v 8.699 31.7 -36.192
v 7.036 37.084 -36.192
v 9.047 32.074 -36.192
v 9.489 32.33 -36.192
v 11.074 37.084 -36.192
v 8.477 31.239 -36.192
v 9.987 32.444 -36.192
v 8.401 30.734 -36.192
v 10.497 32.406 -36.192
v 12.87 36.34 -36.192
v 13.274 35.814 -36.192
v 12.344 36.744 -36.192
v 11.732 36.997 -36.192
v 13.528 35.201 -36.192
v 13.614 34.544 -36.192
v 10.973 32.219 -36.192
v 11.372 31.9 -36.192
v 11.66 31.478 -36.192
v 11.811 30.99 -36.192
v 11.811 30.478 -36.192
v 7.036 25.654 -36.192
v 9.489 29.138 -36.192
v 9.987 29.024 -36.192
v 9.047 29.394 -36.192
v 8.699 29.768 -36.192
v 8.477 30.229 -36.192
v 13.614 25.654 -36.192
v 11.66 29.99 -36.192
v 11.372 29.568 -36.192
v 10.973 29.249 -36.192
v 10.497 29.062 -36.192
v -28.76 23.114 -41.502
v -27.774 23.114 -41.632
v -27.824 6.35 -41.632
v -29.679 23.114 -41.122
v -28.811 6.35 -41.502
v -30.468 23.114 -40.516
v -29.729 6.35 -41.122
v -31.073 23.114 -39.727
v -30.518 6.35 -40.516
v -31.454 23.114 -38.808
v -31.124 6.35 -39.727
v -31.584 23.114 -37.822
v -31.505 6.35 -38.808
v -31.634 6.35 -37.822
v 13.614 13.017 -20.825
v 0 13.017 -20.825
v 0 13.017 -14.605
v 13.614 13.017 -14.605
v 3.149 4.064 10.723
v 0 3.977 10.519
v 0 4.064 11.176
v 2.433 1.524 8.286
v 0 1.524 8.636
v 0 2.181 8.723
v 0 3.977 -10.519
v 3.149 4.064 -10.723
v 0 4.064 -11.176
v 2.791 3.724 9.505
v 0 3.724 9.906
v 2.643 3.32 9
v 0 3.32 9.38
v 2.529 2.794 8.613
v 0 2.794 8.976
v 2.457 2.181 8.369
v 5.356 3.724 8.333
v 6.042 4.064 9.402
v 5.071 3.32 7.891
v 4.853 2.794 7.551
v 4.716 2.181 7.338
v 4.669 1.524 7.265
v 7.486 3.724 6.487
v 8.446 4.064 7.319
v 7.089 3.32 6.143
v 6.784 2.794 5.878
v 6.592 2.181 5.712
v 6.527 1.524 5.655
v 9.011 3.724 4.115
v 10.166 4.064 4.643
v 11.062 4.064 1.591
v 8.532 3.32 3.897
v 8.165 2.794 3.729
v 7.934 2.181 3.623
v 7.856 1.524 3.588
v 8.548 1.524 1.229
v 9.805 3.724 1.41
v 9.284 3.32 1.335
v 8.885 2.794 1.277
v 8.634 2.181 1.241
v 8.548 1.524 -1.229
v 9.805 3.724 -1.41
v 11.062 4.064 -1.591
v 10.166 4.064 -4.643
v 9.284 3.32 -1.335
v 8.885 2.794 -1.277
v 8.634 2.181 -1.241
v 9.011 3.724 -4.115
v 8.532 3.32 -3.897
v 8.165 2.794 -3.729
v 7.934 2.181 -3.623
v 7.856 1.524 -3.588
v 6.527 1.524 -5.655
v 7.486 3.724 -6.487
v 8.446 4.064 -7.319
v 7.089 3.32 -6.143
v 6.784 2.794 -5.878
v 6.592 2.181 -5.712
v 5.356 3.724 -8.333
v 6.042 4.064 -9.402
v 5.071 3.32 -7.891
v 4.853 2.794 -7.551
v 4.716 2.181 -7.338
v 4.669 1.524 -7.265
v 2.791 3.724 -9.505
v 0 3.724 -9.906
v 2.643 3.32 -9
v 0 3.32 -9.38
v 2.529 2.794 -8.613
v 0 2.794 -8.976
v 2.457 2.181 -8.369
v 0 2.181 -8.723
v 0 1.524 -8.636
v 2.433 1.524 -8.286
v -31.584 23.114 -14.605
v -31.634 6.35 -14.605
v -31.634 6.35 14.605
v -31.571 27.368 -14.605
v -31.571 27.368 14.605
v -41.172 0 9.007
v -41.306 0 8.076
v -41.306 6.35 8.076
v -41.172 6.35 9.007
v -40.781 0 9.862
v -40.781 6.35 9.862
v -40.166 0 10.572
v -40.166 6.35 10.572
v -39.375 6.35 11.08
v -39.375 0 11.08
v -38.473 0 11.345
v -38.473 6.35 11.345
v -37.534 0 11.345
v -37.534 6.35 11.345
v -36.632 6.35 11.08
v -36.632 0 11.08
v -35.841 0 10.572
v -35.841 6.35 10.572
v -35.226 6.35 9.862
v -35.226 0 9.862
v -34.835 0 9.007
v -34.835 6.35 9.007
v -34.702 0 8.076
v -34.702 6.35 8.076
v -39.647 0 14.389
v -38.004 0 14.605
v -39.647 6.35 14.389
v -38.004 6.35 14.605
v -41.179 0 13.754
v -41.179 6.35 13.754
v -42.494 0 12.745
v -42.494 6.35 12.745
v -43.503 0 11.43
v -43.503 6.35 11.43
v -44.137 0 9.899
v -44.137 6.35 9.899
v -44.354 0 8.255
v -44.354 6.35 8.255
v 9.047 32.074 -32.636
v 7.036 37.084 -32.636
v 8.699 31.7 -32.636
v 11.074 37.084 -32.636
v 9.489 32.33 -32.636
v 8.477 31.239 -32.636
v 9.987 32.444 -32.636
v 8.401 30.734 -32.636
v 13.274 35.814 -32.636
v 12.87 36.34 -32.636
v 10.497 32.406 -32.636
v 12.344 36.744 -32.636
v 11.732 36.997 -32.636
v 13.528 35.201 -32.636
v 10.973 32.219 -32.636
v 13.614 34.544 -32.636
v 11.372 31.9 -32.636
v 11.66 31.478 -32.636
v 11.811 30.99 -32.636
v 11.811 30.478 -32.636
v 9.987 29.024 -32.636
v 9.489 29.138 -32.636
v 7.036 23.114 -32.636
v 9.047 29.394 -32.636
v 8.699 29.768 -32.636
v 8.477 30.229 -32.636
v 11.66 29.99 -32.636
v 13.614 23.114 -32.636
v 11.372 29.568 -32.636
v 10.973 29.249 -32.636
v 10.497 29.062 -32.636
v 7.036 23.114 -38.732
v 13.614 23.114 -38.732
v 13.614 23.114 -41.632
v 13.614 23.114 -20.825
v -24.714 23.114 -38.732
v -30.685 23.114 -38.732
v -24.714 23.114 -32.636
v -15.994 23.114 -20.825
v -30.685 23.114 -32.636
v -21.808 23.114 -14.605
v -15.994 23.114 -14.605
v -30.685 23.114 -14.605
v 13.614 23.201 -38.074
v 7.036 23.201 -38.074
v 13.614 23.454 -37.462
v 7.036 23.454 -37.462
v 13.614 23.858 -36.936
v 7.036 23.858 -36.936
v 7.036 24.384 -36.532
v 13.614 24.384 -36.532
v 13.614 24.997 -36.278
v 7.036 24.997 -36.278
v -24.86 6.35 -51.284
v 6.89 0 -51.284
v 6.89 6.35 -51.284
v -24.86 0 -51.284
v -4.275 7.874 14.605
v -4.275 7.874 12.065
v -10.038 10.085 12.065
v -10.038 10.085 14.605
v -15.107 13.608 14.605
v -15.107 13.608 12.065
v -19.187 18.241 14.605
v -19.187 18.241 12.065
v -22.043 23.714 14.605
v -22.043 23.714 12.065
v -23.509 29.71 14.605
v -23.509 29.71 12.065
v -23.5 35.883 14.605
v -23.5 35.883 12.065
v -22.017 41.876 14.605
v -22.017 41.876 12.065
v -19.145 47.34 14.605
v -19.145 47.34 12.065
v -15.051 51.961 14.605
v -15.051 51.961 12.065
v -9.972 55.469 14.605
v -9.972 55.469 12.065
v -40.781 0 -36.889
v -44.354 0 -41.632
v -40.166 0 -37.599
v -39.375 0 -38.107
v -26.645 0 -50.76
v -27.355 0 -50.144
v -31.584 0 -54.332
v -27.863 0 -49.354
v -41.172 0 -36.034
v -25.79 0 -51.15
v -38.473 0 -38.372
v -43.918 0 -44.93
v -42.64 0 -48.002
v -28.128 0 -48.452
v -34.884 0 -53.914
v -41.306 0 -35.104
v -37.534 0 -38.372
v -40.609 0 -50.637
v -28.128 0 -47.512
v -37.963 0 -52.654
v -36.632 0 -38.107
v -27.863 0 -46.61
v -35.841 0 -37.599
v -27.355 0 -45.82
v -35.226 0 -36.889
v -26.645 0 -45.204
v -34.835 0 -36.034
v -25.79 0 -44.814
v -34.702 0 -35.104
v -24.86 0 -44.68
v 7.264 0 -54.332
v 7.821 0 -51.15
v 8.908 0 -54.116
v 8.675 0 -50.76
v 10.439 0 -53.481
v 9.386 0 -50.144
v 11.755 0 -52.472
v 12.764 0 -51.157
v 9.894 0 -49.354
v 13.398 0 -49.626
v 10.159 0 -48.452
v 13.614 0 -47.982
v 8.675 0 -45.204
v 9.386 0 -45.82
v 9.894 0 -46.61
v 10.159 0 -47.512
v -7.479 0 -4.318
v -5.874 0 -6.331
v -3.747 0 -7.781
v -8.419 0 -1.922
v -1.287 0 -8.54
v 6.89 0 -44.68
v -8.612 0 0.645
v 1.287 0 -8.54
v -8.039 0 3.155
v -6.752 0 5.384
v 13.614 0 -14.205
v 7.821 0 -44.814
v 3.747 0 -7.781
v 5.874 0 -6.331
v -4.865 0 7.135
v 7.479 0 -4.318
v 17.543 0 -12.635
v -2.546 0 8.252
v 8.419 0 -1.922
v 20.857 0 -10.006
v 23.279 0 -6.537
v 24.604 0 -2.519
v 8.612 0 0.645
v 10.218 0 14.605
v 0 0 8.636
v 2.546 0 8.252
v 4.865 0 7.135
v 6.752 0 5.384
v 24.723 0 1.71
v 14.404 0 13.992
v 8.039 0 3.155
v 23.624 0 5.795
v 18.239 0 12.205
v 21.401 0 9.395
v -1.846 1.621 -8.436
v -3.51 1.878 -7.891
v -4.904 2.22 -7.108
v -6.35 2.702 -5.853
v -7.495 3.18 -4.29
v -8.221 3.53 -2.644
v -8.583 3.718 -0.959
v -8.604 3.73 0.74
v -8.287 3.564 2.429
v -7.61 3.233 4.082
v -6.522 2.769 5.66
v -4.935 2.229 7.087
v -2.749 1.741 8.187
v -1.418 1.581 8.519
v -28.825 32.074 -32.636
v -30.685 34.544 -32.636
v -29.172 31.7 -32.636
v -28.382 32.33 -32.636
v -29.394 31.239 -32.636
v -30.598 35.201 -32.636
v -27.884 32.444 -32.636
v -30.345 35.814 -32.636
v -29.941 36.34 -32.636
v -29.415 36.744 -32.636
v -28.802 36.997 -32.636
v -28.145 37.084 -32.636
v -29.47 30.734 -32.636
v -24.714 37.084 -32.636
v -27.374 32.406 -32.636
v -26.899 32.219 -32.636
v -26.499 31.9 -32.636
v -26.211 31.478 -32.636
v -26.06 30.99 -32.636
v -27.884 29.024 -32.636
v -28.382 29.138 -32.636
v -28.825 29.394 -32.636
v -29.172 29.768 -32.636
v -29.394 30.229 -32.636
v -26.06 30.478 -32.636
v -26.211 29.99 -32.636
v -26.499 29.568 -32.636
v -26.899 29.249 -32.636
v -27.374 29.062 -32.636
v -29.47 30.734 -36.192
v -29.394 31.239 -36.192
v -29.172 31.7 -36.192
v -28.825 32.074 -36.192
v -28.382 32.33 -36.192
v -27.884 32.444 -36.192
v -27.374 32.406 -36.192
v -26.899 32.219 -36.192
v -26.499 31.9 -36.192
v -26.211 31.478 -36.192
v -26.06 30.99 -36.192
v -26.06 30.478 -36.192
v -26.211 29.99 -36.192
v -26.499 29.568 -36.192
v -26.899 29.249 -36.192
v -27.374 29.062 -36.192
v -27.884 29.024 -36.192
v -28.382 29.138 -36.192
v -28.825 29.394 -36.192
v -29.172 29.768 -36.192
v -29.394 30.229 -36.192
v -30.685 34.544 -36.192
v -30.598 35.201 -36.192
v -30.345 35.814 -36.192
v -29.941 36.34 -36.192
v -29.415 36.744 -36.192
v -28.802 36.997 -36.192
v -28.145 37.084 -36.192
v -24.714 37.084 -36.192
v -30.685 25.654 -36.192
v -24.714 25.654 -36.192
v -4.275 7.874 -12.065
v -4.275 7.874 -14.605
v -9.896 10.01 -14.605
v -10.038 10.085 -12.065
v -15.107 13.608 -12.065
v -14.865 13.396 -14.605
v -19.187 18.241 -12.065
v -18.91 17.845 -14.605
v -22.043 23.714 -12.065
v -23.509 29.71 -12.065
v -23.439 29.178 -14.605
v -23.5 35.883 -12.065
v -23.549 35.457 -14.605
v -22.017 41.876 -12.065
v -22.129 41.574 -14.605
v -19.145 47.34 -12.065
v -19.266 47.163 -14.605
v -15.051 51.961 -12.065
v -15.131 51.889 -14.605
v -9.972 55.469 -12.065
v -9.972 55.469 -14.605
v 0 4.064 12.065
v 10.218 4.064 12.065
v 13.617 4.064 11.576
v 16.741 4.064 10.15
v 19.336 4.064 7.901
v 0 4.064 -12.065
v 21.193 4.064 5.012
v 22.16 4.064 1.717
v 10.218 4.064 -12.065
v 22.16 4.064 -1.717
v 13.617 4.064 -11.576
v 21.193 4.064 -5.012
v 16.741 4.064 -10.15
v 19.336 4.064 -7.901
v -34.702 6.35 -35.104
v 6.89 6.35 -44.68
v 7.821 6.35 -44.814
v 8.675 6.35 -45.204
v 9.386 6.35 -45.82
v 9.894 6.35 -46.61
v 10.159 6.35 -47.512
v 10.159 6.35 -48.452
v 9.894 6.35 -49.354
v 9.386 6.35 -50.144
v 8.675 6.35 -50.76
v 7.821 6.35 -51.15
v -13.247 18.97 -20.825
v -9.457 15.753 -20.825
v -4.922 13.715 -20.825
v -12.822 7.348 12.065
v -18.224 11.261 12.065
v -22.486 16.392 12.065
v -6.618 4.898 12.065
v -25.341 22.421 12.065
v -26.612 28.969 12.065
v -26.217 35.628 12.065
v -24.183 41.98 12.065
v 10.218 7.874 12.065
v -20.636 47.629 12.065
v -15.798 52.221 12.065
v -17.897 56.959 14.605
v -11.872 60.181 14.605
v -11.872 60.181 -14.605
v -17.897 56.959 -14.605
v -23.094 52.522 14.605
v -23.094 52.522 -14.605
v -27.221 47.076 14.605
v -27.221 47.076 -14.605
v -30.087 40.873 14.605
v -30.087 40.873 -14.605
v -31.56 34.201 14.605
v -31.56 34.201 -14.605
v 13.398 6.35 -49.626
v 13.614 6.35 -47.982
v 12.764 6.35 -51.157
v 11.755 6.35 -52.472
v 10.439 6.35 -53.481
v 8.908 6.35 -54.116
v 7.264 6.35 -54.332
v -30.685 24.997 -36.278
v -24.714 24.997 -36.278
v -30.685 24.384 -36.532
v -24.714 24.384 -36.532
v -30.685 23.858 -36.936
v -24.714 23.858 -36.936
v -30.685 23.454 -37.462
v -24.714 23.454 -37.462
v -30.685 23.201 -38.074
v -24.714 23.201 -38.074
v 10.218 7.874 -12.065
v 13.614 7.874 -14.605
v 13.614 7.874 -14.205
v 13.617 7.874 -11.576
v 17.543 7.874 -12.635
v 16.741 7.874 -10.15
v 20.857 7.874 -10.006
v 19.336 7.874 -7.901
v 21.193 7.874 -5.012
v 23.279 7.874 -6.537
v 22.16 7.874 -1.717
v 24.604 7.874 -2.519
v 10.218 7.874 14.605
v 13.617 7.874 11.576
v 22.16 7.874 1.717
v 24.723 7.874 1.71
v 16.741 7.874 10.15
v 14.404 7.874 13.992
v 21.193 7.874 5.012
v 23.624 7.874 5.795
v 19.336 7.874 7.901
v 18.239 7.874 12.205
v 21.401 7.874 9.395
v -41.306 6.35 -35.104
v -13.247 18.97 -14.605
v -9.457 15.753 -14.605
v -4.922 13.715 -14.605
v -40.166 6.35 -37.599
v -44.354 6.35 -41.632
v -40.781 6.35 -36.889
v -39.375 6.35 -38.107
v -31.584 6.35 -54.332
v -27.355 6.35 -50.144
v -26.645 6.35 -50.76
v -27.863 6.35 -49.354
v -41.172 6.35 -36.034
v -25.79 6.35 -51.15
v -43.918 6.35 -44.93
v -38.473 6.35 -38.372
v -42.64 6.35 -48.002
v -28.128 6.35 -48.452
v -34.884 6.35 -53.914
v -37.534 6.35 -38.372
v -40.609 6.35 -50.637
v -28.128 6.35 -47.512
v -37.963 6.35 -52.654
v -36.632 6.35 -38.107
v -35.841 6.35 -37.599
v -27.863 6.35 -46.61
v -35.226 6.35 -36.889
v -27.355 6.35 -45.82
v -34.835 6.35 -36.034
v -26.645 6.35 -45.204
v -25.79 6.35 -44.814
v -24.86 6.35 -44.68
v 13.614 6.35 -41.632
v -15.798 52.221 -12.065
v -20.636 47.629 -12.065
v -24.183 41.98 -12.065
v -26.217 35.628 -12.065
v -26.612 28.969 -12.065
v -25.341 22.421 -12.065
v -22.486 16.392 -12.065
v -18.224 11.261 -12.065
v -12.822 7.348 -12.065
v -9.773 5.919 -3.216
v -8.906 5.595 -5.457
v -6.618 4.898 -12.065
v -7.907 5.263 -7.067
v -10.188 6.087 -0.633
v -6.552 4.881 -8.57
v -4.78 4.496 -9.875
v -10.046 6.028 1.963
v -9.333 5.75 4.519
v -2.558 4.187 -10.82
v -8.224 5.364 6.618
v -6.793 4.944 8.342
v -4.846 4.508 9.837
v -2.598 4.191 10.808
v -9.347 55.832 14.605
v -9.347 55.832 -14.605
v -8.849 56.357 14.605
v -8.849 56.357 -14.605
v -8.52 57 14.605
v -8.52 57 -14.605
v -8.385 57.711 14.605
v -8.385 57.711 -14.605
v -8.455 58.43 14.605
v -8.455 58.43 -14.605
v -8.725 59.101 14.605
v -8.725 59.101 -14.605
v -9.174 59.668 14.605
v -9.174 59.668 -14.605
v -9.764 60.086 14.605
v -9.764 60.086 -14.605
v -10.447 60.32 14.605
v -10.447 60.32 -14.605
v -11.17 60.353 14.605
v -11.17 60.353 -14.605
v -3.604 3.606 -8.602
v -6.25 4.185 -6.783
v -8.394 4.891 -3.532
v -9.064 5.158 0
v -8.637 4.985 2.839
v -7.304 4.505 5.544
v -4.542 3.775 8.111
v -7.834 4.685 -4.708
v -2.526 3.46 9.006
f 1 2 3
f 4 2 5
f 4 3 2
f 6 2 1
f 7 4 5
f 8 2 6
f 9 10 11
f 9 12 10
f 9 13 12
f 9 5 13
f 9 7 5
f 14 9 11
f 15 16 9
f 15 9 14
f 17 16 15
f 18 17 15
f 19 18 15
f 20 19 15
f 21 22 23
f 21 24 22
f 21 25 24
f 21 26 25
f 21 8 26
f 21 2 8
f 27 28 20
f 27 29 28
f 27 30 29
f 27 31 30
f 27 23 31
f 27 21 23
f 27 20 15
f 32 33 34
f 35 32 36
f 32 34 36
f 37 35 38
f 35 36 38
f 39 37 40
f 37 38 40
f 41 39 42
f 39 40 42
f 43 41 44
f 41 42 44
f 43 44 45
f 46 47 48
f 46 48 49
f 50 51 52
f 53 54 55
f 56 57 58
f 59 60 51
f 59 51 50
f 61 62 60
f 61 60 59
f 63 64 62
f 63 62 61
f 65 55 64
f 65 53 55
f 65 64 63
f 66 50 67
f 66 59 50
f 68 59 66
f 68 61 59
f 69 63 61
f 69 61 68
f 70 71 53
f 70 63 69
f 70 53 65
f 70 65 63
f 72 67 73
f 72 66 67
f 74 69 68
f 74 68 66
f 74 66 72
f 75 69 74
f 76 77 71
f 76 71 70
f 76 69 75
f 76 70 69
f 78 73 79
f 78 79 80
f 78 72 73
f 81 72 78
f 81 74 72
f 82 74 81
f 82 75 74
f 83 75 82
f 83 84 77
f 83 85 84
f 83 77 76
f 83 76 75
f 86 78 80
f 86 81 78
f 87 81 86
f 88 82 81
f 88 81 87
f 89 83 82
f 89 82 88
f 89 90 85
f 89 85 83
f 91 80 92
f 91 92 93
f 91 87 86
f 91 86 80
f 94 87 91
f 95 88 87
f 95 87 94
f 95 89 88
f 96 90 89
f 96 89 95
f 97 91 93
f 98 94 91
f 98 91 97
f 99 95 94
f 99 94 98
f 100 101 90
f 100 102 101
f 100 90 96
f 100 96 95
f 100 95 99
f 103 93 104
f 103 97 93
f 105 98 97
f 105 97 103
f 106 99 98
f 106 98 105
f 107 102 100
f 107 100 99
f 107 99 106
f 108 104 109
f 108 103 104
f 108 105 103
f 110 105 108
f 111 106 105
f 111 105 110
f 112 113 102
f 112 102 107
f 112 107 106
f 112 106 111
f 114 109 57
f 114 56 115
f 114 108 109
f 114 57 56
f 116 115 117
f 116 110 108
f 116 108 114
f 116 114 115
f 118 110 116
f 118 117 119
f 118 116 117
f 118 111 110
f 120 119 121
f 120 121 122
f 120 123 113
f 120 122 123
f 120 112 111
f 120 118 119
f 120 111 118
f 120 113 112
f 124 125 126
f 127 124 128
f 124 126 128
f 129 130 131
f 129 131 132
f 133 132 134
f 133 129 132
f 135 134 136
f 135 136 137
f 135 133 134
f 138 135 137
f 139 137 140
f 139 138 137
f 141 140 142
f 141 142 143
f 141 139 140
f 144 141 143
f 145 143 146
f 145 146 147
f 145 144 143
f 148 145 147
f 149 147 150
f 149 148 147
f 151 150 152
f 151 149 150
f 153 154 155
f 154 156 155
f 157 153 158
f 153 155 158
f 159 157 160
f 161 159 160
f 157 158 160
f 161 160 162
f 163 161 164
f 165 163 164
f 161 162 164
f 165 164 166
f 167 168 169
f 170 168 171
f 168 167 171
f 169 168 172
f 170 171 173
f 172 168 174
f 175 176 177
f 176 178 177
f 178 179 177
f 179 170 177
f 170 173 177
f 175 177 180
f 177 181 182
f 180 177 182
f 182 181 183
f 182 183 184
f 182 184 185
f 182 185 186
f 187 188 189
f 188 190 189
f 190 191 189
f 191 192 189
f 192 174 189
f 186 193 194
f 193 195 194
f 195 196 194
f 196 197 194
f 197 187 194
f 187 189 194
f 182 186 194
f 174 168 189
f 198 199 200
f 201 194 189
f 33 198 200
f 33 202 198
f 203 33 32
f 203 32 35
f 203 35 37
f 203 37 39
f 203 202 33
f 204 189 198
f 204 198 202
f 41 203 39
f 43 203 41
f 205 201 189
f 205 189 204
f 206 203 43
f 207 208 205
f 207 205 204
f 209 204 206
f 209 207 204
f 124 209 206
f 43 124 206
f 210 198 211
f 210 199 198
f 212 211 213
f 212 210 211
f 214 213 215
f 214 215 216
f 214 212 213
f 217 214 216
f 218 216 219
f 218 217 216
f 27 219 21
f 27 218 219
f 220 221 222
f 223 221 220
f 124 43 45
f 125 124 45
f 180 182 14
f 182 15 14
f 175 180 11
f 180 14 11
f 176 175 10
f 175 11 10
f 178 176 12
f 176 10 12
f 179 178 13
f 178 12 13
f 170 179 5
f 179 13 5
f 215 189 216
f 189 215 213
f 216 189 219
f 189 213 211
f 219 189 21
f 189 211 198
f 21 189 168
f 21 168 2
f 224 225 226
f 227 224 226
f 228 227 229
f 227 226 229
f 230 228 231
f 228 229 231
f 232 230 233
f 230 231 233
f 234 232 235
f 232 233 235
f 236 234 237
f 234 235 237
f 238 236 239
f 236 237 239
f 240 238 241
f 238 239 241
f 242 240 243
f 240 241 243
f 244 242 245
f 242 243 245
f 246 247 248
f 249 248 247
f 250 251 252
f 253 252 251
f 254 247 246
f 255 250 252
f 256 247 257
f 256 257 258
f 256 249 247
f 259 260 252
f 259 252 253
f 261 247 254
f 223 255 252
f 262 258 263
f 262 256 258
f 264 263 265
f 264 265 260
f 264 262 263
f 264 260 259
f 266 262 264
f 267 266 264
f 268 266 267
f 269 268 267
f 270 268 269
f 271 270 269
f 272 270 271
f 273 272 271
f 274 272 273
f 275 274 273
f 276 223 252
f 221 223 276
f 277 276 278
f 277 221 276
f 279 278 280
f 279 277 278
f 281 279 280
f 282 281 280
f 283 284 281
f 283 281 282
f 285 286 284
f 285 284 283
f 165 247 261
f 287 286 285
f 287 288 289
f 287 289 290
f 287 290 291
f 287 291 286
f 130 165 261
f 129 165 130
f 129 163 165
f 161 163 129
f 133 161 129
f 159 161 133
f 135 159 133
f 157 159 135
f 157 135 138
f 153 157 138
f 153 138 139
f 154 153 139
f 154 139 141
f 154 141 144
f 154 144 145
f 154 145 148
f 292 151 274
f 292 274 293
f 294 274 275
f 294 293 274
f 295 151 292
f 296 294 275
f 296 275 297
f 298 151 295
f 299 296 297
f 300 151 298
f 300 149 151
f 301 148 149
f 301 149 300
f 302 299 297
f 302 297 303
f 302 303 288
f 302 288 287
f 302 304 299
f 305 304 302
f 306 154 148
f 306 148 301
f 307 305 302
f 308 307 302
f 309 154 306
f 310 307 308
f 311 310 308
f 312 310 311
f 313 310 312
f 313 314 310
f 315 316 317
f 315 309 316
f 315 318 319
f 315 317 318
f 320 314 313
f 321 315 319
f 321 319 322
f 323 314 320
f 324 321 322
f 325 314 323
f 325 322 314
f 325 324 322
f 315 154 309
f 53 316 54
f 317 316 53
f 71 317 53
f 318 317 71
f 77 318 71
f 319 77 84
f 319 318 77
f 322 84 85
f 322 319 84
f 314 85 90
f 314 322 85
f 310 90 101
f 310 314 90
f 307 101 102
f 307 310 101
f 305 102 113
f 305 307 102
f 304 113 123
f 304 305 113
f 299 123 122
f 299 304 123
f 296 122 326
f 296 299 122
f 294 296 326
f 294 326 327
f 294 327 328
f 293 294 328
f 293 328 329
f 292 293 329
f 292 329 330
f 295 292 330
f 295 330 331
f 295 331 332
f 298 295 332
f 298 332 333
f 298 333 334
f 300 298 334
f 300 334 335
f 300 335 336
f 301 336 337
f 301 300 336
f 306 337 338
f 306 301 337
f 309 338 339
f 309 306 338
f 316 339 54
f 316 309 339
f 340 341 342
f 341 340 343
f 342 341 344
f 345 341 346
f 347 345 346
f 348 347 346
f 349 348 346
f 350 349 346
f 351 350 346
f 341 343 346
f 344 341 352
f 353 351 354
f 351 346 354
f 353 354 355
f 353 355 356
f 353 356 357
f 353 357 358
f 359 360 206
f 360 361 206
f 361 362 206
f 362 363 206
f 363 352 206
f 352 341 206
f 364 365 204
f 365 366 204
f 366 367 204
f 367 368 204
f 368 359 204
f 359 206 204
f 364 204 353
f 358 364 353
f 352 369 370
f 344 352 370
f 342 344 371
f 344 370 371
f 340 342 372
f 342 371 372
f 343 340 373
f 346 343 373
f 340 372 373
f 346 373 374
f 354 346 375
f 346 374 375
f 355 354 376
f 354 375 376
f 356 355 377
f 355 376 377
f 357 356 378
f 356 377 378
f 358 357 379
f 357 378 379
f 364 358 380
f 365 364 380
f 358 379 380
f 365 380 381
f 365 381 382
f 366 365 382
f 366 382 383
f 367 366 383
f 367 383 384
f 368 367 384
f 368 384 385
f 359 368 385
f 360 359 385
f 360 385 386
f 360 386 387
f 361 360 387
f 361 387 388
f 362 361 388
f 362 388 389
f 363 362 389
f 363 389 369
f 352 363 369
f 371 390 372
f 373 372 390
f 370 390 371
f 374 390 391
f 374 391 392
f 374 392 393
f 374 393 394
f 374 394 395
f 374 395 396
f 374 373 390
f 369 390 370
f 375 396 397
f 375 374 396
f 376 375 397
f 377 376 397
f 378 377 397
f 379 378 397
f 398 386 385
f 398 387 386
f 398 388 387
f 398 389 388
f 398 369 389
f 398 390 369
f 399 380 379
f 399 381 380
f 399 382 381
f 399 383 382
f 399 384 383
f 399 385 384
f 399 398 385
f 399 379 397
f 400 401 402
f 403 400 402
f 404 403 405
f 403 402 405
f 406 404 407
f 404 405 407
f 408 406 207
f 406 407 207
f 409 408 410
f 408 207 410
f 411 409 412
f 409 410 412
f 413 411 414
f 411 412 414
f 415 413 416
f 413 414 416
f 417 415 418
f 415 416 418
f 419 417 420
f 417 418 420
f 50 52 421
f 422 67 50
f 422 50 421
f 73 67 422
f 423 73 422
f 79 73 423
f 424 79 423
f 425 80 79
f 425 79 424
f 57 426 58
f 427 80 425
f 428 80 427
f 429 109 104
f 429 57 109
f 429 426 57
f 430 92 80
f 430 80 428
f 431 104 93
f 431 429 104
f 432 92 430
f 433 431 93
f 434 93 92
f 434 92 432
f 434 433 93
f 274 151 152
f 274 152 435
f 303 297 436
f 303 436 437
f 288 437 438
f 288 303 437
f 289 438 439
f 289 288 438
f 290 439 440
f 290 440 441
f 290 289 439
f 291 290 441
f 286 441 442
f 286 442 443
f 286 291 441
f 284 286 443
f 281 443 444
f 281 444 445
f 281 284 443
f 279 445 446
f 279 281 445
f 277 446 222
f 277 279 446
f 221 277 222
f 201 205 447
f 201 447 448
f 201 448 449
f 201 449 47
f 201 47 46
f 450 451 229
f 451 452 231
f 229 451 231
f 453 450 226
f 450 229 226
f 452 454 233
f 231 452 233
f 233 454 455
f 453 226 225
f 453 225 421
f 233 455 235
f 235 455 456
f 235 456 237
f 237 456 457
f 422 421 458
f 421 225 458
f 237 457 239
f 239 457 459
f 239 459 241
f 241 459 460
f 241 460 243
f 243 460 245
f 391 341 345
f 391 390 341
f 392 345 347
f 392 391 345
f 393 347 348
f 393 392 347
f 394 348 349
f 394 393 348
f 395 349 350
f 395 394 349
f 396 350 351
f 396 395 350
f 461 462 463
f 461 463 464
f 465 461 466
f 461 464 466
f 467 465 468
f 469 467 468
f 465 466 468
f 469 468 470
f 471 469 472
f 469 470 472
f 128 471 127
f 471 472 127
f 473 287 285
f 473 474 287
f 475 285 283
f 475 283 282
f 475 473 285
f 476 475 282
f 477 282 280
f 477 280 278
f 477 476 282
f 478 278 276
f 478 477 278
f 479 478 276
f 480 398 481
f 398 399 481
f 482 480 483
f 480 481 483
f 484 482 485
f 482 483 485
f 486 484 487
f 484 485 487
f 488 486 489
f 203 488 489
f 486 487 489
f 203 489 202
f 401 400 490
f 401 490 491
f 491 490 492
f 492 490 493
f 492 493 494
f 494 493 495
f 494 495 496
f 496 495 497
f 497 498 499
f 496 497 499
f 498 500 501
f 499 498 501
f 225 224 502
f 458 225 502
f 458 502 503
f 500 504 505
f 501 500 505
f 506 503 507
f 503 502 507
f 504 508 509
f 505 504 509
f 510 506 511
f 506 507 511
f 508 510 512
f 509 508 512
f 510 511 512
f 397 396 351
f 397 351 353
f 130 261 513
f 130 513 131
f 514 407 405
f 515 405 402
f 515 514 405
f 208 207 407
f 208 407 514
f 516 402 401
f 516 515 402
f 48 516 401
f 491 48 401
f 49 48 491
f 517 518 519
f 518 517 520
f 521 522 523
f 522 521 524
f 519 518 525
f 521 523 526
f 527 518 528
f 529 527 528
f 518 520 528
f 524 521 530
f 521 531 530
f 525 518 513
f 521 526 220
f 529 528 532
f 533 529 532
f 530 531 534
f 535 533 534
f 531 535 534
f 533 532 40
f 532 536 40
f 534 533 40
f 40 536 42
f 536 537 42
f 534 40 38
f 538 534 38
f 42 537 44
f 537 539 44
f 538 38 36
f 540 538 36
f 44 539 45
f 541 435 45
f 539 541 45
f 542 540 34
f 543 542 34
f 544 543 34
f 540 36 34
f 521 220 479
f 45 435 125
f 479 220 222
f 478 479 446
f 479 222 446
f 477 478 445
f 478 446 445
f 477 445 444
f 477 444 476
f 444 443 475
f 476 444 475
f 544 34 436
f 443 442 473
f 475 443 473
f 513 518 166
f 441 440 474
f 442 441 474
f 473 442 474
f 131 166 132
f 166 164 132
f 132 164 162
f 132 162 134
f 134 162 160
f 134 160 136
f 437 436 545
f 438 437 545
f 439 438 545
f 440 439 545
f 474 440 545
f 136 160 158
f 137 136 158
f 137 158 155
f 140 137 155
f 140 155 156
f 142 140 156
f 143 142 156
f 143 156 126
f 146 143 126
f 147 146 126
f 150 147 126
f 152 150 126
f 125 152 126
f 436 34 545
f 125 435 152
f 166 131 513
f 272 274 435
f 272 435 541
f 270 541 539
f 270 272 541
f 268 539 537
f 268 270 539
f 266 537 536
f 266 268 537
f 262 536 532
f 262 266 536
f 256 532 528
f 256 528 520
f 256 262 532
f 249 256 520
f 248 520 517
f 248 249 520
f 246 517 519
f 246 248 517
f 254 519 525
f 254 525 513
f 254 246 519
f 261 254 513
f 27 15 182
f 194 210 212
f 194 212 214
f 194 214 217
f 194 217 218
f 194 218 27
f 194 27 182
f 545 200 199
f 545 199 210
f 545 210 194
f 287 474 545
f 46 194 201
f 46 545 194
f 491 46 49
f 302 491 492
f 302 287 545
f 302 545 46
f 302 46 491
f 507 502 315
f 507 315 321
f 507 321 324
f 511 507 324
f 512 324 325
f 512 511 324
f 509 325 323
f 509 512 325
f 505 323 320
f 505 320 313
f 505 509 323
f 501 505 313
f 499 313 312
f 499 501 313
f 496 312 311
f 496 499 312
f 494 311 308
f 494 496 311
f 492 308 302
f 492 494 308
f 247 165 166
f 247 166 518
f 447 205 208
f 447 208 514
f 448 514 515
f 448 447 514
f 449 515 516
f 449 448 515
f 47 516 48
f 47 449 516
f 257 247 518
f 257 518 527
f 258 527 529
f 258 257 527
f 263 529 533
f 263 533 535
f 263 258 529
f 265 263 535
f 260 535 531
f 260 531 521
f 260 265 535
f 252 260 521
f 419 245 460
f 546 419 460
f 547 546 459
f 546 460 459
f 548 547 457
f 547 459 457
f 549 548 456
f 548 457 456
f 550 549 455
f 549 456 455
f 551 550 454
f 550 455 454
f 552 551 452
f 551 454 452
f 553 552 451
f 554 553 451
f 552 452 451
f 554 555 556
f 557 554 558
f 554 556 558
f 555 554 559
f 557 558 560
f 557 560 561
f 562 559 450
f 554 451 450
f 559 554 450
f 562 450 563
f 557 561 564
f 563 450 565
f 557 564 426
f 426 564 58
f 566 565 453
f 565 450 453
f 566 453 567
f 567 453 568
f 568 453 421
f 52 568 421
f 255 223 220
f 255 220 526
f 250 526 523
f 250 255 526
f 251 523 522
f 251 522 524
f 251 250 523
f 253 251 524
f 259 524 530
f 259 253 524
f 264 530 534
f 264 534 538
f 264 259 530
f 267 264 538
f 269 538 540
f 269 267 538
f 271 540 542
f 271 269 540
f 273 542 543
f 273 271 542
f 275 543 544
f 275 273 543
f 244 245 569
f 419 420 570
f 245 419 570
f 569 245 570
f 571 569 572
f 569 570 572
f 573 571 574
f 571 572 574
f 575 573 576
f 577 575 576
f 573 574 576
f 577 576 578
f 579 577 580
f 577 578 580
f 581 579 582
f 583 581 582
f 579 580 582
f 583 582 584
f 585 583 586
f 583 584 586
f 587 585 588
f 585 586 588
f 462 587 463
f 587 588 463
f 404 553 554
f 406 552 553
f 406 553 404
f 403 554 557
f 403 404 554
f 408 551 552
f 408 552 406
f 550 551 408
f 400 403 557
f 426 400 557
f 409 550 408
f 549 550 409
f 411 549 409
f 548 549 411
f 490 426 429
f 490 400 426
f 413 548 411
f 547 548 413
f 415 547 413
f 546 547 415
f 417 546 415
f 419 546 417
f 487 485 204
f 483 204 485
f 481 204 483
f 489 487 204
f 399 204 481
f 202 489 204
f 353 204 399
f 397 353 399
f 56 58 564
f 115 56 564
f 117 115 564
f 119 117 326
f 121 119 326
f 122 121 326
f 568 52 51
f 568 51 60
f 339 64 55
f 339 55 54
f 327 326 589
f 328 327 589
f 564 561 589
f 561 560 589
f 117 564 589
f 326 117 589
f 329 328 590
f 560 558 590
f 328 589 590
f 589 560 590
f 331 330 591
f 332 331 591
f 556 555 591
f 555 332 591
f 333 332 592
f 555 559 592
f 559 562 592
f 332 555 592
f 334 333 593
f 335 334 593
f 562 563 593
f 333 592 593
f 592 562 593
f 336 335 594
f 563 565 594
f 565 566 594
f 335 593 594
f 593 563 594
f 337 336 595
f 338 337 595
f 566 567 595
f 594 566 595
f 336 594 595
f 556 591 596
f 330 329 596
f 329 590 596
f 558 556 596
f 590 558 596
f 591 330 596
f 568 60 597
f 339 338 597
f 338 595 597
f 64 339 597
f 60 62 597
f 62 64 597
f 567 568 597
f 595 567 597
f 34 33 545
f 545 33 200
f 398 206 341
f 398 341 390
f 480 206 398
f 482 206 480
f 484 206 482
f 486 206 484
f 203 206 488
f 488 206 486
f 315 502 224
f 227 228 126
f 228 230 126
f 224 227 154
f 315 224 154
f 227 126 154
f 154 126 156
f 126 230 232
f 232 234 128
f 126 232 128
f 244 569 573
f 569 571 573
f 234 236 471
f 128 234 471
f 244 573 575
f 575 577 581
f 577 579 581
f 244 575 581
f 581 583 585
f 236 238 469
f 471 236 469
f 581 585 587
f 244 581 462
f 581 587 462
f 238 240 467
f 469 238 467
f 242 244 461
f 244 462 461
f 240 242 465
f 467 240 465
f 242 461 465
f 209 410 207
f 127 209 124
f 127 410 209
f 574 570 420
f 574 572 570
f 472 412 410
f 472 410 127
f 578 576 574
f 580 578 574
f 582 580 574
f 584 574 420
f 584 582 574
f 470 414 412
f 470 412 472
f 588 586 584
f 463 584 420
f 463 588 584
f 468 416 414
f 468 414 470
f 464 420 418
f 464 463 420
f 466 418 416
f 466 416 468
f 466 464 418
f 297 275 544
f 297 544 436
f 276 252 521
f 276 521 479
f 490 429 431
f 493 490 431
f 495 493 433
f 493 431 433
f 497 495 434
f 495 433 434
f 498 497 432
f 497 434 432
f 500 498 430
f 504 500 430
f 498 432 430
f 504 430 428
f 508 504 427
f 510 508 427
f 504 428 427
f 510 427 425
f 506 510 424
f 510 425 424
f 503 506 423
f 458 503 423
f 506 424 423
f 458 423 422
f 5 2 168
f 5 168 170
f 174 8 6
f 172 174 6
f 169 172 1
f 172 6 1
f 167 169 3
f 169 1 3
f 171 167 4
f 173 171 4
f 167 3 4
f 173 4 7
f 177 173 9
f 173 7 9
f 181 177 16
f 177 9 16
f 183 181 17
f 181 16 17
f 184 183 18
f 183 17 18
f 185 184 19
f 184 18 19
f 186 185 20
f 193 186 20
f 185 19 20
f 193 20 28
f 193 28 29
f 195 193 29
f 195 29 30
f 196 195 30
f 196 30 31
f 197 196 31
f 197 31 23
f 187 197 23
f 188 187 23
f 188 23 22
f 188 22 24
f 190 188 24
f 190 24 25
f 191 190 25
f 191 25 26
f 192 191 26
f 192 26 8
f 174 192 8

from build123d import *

# Parameters (mm, degrees)
SKETCH1_W                       = 63.5
SKETCH1_H                       = 24.13
BOSS_EXTRUDE1_DEPTH             = 4.064
BOSS_EXTRUDE2_REACH             = 36.207
BOSS_EXTRUDE2_DIRECTION_2_REACH = 36.207
CUT_EXTRUDE1_DEPTH              = 4.064
CUT_EXTRUDE1_DEPTH_BACK         = 66.752974943
SKETCH4_R                       = 8.636
FILLET1_R                       = 2.54
CUT_EXTRUDE2_DEPTH              = 73.348315655
BOSS_EXTRUDE3_DEPTH             = 2.54
BOSS_EXTRUDE4_START             = 2.54
BOSS_EXTRUDE4_DEPTH             = 2.54
BOSS_EXTRUDE5_DEPTH             = 3.81
CUT_EXTRUDE3_DEPTH              = 64.061052508
BOSS_EXTRUDE6_START             = -23.114
SKETCH12_W                      = 44.831
SKETCH12_H                      = 27.027043781
BOSS_EXTRUDE6_DEPTH             = 23.114
BOSS_EXTRUDE7_DEPTH             = 7.874
CUT_EXTRUDE4_START              = -6.219751
CUT_EXTRUDE4_DEPTH              = 6.219751
CUT_EXTRUDE5_DEPTH              = 27.027043781
SKETCH17_W                      = 6.9977
SKETCH17_H                      = 3.556
BOSS_EXTRUDE8_DEPTH             = 13.97
SKETCH18_W                      = 6.389869694
SKETCH18_H                      = 3.556
BOSS_EXTRUDE9_DEPTH             = 13.97
SKETCH19_W                      = 31.75
SKETCH19_H                      = 7.112
CUT_EXTRUDE6_DEPTH              = 13.97
CUT_EXTRUDE7_REACH              = 87.043
SKETCH20_R                      = 1.7145
FILLET2_R                       = 2.54
FILLET3_R                       = 2.54
FILLET4_R                       = 2.54
BOSS_EXTRUDE10_DEPTH            = 29.21
BOSS_EXTRUDE11_DEPTH            = 27.027043781
BOSS_EXTRUDE16_DEPTH            = 6.35
FILLET5_R                       = 6.35
FILLET6_R                       = 3.81


with BuildPart() as part:
    # Sketch1 → Boss-Extrude1 (new body)
    with BuildSketch(Plane(origin=(0, 0, 0), x_dir=(1, 0, 0), z_dir=(0, 1, 0))):
        Rectangle(SKETCH1_W, SKETCH1_H)
    extrude(amount=BOSS_EXTRUDE1_DEPTH)

    # Boss-Extrude2: up to this face of the body (flat: up to its plane)
    boss_extrude2_end = Plane(part.part.faces().sort_by_distance((0, 2.032, 12.065))[0])
    # Sketch2 → Boss-Extrude2 (add, up to the picked face)
    with BuildSketch(Plane.XY, mode=Mode.PRIVATE) as boss_extrude2_sk1:
        with BuildLine():
            Line((0, 4.064), (-26.716755185, 4.064))
            Line((-26.716755185, 4.064), (-31.571041118, 27.367716778))
            ThreePointArc((-31.571041118, 27.367716778), (-27.221246487, 47.076161415), (-11.87173913, 60.180974548))
            ThreePointArc((-11.87173913, 60.180974548), (-8.566242036, 58.774955714), (-9.97226087, 55.46945862))
            ThreePointArc((-9.97226087, 55.46945862), (-26.181898149, 25.654914521), (0, 4.064))
        make_face()
    boss_extrude2_tool1 = split(extrude(boss_extrude2_sk1.sketch, amount=BOSS_EXTRUDE2_REACH, mode=Mode.PRIVATE), bisect_by=boss_extrude2_end, keep=Keep.BOTH, mode=Mode.PRIVATE)
    add(boss_extrude2_tool1.solids().sort_by(Axis((-9.165723, 58.533271, 0), (0, 0, 1)))[0])

    # Boss-Extrude2 direction 2: up to this face of the body (flat: up to its plane)
    boss_extrude2_direction_2_end = Plane(part.part.faces().sort_by_distance((0, 2.032, -12.065))[0])
    # Sketch2 → Boss-Extrude2 direction 2 (add, up to the picked face)
    with BuildSketch(Plane.XY, mode=Mode.PRIVATE) as boss_extrude2_direction_2_sk1:
        with BuildLine():
            Line((0, 4.064), (-26.716755185, 4.064))
            Line((-26.716755185, 4.064), (-31.571041118, 27.367716778))
            ThreePointArc((-31.571041118, 27.367716778), (-27.221246487, 47.076161415), (-11.87173913, 60.180974548))
            ThreePointArc((-11.87173913, 60.180974548), (-8.566242036, 58.774955714), (-9.97226087, 55.46945862))
            ThreePointArc((-9.97226087, 55.46945862), (-26.181898149, 25.654914521), (0, 4.064))
        make_face()
    boss_extrude2_direction_2_tool1 = split(extrude(boss_extrude2_direction_2_sk1.sketch, amount=-BOSS_EXTRUDE2_DIRECTION_2_REACH, mode=Mode.PRIVATE), bisect_by=boss_extrude2_direction_2_end, keep=Keep.BOTH, mode=Mode.PRIVATE)
    add(boss_extrude2_direction_2_tool1.solids().sort_by(Axis((-9.165723, 58.533271, 0), (0, 0, -1)))[0])

    # Sketch4 → Cut-Extrude1 (cut, two sides: drawn at the far end of the back side and taken through both)
    with BuildSketch(Plane(origin=(0, 4.064, 0), x_dir=(1, 0, 0), z_dir=(0, 1, 0)).offset(-CUT_EXTRUDE1_DEPTH_BACK)):
        with Locations(Location((0, 0, 0), (0, 0, 270))):
            Circle(SKETCH4_R)
    extrude(amount=CUT_EXTRUDE1_DEPTH + CUT_EXTRUDE1_DEPTH_BACK, mode=Mode.SUBTRACT)

    # Fillet1
    fillet1_edges = [part.edges().sort_by_distance(p)[0] for p in [
        (-8.636, 5.50091846, 0),
        (8.636, 4.064, 0),
    ]]
    fillet(fillet1_edges, radius=FILLET1_R)

    # Sketch6 → Cut-Extrude2 (cut, through all)
    with BuildSketch(Plane.XY.offset(12.065)):
        Polygon((-31.75, 4.064), (-26.716755185, 4.064), (-25.870202757, 0), (-31.75, 0), align=None)
    extrude(amount=-CUT_EXTRUDE2_DEPTH, mode=Mode.SUBTRACT)

    # Sketch8 → Boss-Extrude3 (add)
    with BuildSketch(Plane.XY.offset(12.065)):
        with BuildLine():
            Line((31.75, 0), (31.75, 7.874))
            Line((31.75, 7.874), (-4.274632474, 7.874))
            ThreePointArc((-4.274632474, 7.874), (-23.508790492, 29.710248048), (-9.97226087, 55.46945862))
            ThreePointArc((-9.97226087, 55.46945862), (-8.566242036, 58.774955714), (-11.87173913, 60.180974548))
            ThreePointArc((-11.87173913, 60.180974548), (-27.221246487, 47.076161415), (-31.571041118, 27.367716778))
            Line((-31.571041118, 27.367716778), (-25.870202757, 0))
            Line((-25.870202757, 0), (31.75, 0))
        make_face()
    extrude(amount=BOSS_EXTRUDE3_DEPTH)

    # Sketch9 → Boss-Extrude4 (add)
    with BuildSketch(Plane(origin=(0, 0, -12.065), x_dir=(-1, 0, 0), z_dir=(0, 0, -1)).offset(BOSS_EXTRUDE4_START)):
        with BuildLine():
            Line((-31.75, 0), (-31.75, 7.874))
            Line((-31.75, 7.874), (4.274632474, 7.874))
            ThreePointArc((4.274632474, 7.874), (23.508790492, 29.710248048), (9.97226087, 55.46945862))
            ThreePointArc((9.97226087, 55.46945862), (8.566242036, 58.774955714), (11.87173913, 60.180974548))
            ThreePointArc((11.87173913, 60.180974548), (27.221246487, 47.076161415), (31.571041118, 27.367716778))
            Line((31.571041118, 27.367716778), (25.870202757, 0))
            Line((25.870202757, 0), (-31.75, 0))
        make_face()
    extrude(amount=-BOSS_EXTRUDE4_DEPTH)

    # Sketch10 → Boss-Extrude5 (add)
    with BuildSketch(Plane(origin=(0, 4.064, 0), x_dir=(1, 0, 0), z_dir=(0, 1, 0))):
        with BuildLine():
            Line((10.218295125, 14.605), (10.218295125, 12.065))
            ThreePointArc((10.218295125, 12.065), (22.283295125, 0), (10.218295125, -12.065))
            Line((10.218295125, -12.065), (10.218295125, -14.605))
            ThreePointArc((10.218295125, -14.605), (24.823295125, 0), (10.218295125, 14.605))
        make_face()
    extrude(amount=BOSS_EXTRUDE5_DEPTH)

    # Sketch11 → Cut-Extrude3 (cut, through all)
    with BuildSketch(Plane(origin=(0, 7.874, 0), x_dir=(1, 0, 0), z_dir=(0, 1, 0))):
        with BuildLine():
            Line((10.218295125, 14.605), (31.75, 14.605))
            Line((31.75, 14.605), (31.75, -14.605))
            Line((31.75, -14.605), (10.218295125, -14.605))
            ThreePointArc((10.218295125, -14.605), (24.823295125, 0), (10.218295125, 14.605))
        make_face()
    extrude(amount=-CUT_EXTRUDE3_DEPTH, mode=Mode.SUBTRACT)

    # Sketch12 → Boss-Extrude6 (add)
    with BuildSketch(Plane.XZ.offset(BOSS_EXTRUDE6_START)):
        with Locations((-8.8011, -28.11852189)):
            Rectangle(SKETCH12_W, SKETCH12_H)
    extrude(amount=BOSS_EXTRUDE6_DEPTH)

    # Sketch13 → Boss-Extrude7 (add)
    with BuildSketch(Plane.XZ):
        Polygon((10.218295125, -14.605), (13.6144, -14.605), (13.6144, -13.335525526), align=None)
    extrude(amount=-BOSS_EXTRUDE7_DEPTH)

    # Sketch14 → Cut-Extrude4 (cut)
    with BuildSketch(Plane.XY.offset(-14.605).offset(CUT_EXTRUDE4_START)):
        with BuildLine():
            Line((0, 13.017313502), (18.620278687, 13.017313502))
            Line((18.620278687, 13.017313502), (17.716686498, 30.734))
            ThreePointArc((17.716686498, 30.734), (-12.527589163, 43.261589163), (0, 13.017313502))
        make_face()
    extrude(amount=CUT_EXTRUDE4_DEPTH, mode=Mode.SUBTRACT)

    # Sketch16 → Cut-Extrude5 (cut)
    with BuildSketch(Plane.XY.offset(-14.605)):
        Polygon((-31.2166, 23.114), (-30.684969694, 23.114), (-25.870202757, 0), (-31.2166, 0), align=None)
    extrude(amount=-CUT_EXTRUDE5_DEPTH, mode=Mode.SUBTRACT)

    # Sketch17 → Boss-Extrude8 (add)
    with BuildSketch(Plane(origin=(0, 23.114, 0), x_dir=(1, 0, 0), z_dir=(0, 1, 0))):
        with Locations((10.11555, 34.413750632)):
            Rectangle(SKETCH17_W, SKETCH17_H)
    extrude(amount=BOSS_EXTRUDE8_DEPTH)

    # Sketch18 → Boss-Extrude9 (add)
    with BuildSketch(Plane(origin=(0, 23.114, 0), x_dir=(1, 0, 0), z_dir=(0, 1, 0))):
        with Locations((-27.490034847, 34.413750632)):
            Rectangle(SKETCH18_W, SKETCH18_H)
    extrude(amount=BOSS_EXTRUDE9_DEPTH)

    # Sketch19 → Cut-Extrude6 (cut)
    with BuildSketch(Plane(origin=(0, 37.084, 0), x_dir=(1, 0, 0), z_dir=(0, 1, 0))):
        with Locations((-8.8392, 36.191750632)):
            Rectangle(SKETCH19_W, SKETCH19_H)
    extrude(amount=-CUT_EXTRUDE6_DEPTH, mode=Mode.SUBTRACT)

    # Sketch20 → Cut-Extrude7 (cut, up to next)
    with BuildSketch(Plane(origin=(0, 0, -36.191750632), x_dir=(-1, 0, 0), z_dir=(0, 0, -1)), mode=Mode.PRIVATE) as cut_extrude7_sk1:
        with Locations((27.75585, 30.734)):
            Circle(SKETCH20_R)
    cut_extrude7_tool1 = extrude(cut_extrude7_sk1.sketch, amount=-CUT_EXTRUDE7_REACH, mode=Mode.PRIVATE) & part.part
    # Sketch20 → Cut-Extrude7 (cut, up to next)
    with BuildSketch(Plane(origin=(0, 0, -36.191750632), x_dir=(-1, 0, 0), z_dir=(0, 0, -1)), mode=Mode.PRIVATE) as cut_extrude7_sk2:
        with Locations((-10.11555, 30.734)):
            Circle(SKETCH20_R)
    cut_extrude7_tool2 = extrude(cut_extrude7_sk2.sketch, amount=-CUT_EXTRUDE7_REACH, mode=Mode.PRIVATE) & part.part
    add(cut_extrude7_tool1.solids().sort_by_distance((-27.75585, 30.734, -36.191751))[0], mode=Mode.SUBTRACT)
    add(cut_extrude7_tool2.solids().sort_by_distance((10.11555, 30.734, -36.191751))[0], mode=Mode.SUBTRACT)

    # Fillet2
    fillet2_edges = [part.edges().sort_by_distance(p)[0] for p in [
        (10.3251, 23.114, -36.191750632),
    ]]
    fillet(fillet2_edges, radius=FILLET2_R)

    # Fillet3
    fillet3_edges = [part.edges().sort_by_distance(p)[0] for p in [
        (-27.699584847, 23.114, -36.191750632),
    ]]
    fillet(fillet3_edges, radius=FILLET3_R)

    # Fillet4
    fillet4_edges = [part.edges().sort_by_distance(p)[0] for p in [
        (13.6144, 37.084, -34.413750632),
        (-30.684969694, 37.084, -34.413750632),
    ]]
    fillet(fillet4_edges, radius=FILLET4_R)

    # Sketch26 → Boss-Extrude10 (add)
    with BuildSketch(Plane.XY.offset(14.605)):
        Polygon((-25.870202757, 0), (-31.653563464, 0), (-31.571041118, 27.367716778), align=None)
    extrude(amount=-BOSS_EXTRUDE10_DEPTH)

    # Sketch22 → Boss-Extrude11 (add)
    with BuildSketch(Plane(origin=(0, 0, -14.605), x_dir=(-1, 0, 0), z_dir=(0, 0, -1))):
        Polygon((30.684969694, 23.114), (31.583867423, 23.114), (31.653563464, 0), (25.870202757, 0), align=None)
    extrude(amount=BOSS_EXTRUDE11_DEPTH)

    # Sketch23 → Boss-Extrude16 (add)
    with BuildSketch(Plane.XZ):
        with BuildLine():
            Line((-15.554631727, 14.605), (-44.353563464, 14.605))
            Line((-44.353563464, 14.605), (-44.353563464, -41.632043781))
            ThreePointArc((-44.353563464, -41.632043781), (-40.609144413, -50.636907459), (-31.583867423, -54.331852538))
            Line((-31.583867423, -54.331852538), (13.6144, -54.332043781))
            Line((13.6144, -54.332043781), (13.6144, -35.10352189))
            Line((13.6144, -35.10352189), (-15.554631727, -35.10352189))
            Line((-15.554631727, -35.10352189), (-15.554631727, 14.605))
        make_face()
        with BuildLine():
            Line((-34.701563464, 8.07647811), (-34.701563464, -35.10352189))
            ThreePointArc((-34.701563464, -35.10352189), (-38.003563464, -38.40552189), (-41.305563464, -35.10352189))
            Line((-41.305563464, -35.10352189), (-41.305563464, 8.07647811))
            ThreePointArc((-41.305563464, 8.07647811), (-38.003563464, 11.37847811), (-34.701563464, 8.07647811))
        make_face(mode=Mode.SUBTRACT)
        with BuildLine():
            Line((-24.859733712, -44.680043781), (6.890266288, -44.680043781))
            ThreePointArc((6.890266288, -44.680043781), (10.192266288, -47.982043781), (6.890266288, -51.284043781))
            Line((6.890266288, -51.284043781), (-24.859733712, -51.284043781))
            ThreePointArc((-24.859733712, -51.284043781), (-28.161733712, -47.982043781), (-24.859733712, -44.680043781))
        make_face(mode=Mode.SUBTRACT)
    extrude(amount=-BOSS_EXTRUDE16_DEPTH)

    # Fillet5
    fillet5_edges = [part.edges().sort_by_distance(p)[0] for p in [
        (13.6144, 3.175, -54.332043781),
        (-44.353563464, 3.175, 14.605),
    ]]
    fillet(fillet5_edges, radius=FILLET5_R)

    # Fillet6
    fillet6_edges = [part.edges().sort_by_distance(p)[0] for p in [
        (-31.609141812, 14.732, -41.632043781),
    ]]
    fillet(fillet6_edges, radius=FILLET6_R)


solid = part.part
